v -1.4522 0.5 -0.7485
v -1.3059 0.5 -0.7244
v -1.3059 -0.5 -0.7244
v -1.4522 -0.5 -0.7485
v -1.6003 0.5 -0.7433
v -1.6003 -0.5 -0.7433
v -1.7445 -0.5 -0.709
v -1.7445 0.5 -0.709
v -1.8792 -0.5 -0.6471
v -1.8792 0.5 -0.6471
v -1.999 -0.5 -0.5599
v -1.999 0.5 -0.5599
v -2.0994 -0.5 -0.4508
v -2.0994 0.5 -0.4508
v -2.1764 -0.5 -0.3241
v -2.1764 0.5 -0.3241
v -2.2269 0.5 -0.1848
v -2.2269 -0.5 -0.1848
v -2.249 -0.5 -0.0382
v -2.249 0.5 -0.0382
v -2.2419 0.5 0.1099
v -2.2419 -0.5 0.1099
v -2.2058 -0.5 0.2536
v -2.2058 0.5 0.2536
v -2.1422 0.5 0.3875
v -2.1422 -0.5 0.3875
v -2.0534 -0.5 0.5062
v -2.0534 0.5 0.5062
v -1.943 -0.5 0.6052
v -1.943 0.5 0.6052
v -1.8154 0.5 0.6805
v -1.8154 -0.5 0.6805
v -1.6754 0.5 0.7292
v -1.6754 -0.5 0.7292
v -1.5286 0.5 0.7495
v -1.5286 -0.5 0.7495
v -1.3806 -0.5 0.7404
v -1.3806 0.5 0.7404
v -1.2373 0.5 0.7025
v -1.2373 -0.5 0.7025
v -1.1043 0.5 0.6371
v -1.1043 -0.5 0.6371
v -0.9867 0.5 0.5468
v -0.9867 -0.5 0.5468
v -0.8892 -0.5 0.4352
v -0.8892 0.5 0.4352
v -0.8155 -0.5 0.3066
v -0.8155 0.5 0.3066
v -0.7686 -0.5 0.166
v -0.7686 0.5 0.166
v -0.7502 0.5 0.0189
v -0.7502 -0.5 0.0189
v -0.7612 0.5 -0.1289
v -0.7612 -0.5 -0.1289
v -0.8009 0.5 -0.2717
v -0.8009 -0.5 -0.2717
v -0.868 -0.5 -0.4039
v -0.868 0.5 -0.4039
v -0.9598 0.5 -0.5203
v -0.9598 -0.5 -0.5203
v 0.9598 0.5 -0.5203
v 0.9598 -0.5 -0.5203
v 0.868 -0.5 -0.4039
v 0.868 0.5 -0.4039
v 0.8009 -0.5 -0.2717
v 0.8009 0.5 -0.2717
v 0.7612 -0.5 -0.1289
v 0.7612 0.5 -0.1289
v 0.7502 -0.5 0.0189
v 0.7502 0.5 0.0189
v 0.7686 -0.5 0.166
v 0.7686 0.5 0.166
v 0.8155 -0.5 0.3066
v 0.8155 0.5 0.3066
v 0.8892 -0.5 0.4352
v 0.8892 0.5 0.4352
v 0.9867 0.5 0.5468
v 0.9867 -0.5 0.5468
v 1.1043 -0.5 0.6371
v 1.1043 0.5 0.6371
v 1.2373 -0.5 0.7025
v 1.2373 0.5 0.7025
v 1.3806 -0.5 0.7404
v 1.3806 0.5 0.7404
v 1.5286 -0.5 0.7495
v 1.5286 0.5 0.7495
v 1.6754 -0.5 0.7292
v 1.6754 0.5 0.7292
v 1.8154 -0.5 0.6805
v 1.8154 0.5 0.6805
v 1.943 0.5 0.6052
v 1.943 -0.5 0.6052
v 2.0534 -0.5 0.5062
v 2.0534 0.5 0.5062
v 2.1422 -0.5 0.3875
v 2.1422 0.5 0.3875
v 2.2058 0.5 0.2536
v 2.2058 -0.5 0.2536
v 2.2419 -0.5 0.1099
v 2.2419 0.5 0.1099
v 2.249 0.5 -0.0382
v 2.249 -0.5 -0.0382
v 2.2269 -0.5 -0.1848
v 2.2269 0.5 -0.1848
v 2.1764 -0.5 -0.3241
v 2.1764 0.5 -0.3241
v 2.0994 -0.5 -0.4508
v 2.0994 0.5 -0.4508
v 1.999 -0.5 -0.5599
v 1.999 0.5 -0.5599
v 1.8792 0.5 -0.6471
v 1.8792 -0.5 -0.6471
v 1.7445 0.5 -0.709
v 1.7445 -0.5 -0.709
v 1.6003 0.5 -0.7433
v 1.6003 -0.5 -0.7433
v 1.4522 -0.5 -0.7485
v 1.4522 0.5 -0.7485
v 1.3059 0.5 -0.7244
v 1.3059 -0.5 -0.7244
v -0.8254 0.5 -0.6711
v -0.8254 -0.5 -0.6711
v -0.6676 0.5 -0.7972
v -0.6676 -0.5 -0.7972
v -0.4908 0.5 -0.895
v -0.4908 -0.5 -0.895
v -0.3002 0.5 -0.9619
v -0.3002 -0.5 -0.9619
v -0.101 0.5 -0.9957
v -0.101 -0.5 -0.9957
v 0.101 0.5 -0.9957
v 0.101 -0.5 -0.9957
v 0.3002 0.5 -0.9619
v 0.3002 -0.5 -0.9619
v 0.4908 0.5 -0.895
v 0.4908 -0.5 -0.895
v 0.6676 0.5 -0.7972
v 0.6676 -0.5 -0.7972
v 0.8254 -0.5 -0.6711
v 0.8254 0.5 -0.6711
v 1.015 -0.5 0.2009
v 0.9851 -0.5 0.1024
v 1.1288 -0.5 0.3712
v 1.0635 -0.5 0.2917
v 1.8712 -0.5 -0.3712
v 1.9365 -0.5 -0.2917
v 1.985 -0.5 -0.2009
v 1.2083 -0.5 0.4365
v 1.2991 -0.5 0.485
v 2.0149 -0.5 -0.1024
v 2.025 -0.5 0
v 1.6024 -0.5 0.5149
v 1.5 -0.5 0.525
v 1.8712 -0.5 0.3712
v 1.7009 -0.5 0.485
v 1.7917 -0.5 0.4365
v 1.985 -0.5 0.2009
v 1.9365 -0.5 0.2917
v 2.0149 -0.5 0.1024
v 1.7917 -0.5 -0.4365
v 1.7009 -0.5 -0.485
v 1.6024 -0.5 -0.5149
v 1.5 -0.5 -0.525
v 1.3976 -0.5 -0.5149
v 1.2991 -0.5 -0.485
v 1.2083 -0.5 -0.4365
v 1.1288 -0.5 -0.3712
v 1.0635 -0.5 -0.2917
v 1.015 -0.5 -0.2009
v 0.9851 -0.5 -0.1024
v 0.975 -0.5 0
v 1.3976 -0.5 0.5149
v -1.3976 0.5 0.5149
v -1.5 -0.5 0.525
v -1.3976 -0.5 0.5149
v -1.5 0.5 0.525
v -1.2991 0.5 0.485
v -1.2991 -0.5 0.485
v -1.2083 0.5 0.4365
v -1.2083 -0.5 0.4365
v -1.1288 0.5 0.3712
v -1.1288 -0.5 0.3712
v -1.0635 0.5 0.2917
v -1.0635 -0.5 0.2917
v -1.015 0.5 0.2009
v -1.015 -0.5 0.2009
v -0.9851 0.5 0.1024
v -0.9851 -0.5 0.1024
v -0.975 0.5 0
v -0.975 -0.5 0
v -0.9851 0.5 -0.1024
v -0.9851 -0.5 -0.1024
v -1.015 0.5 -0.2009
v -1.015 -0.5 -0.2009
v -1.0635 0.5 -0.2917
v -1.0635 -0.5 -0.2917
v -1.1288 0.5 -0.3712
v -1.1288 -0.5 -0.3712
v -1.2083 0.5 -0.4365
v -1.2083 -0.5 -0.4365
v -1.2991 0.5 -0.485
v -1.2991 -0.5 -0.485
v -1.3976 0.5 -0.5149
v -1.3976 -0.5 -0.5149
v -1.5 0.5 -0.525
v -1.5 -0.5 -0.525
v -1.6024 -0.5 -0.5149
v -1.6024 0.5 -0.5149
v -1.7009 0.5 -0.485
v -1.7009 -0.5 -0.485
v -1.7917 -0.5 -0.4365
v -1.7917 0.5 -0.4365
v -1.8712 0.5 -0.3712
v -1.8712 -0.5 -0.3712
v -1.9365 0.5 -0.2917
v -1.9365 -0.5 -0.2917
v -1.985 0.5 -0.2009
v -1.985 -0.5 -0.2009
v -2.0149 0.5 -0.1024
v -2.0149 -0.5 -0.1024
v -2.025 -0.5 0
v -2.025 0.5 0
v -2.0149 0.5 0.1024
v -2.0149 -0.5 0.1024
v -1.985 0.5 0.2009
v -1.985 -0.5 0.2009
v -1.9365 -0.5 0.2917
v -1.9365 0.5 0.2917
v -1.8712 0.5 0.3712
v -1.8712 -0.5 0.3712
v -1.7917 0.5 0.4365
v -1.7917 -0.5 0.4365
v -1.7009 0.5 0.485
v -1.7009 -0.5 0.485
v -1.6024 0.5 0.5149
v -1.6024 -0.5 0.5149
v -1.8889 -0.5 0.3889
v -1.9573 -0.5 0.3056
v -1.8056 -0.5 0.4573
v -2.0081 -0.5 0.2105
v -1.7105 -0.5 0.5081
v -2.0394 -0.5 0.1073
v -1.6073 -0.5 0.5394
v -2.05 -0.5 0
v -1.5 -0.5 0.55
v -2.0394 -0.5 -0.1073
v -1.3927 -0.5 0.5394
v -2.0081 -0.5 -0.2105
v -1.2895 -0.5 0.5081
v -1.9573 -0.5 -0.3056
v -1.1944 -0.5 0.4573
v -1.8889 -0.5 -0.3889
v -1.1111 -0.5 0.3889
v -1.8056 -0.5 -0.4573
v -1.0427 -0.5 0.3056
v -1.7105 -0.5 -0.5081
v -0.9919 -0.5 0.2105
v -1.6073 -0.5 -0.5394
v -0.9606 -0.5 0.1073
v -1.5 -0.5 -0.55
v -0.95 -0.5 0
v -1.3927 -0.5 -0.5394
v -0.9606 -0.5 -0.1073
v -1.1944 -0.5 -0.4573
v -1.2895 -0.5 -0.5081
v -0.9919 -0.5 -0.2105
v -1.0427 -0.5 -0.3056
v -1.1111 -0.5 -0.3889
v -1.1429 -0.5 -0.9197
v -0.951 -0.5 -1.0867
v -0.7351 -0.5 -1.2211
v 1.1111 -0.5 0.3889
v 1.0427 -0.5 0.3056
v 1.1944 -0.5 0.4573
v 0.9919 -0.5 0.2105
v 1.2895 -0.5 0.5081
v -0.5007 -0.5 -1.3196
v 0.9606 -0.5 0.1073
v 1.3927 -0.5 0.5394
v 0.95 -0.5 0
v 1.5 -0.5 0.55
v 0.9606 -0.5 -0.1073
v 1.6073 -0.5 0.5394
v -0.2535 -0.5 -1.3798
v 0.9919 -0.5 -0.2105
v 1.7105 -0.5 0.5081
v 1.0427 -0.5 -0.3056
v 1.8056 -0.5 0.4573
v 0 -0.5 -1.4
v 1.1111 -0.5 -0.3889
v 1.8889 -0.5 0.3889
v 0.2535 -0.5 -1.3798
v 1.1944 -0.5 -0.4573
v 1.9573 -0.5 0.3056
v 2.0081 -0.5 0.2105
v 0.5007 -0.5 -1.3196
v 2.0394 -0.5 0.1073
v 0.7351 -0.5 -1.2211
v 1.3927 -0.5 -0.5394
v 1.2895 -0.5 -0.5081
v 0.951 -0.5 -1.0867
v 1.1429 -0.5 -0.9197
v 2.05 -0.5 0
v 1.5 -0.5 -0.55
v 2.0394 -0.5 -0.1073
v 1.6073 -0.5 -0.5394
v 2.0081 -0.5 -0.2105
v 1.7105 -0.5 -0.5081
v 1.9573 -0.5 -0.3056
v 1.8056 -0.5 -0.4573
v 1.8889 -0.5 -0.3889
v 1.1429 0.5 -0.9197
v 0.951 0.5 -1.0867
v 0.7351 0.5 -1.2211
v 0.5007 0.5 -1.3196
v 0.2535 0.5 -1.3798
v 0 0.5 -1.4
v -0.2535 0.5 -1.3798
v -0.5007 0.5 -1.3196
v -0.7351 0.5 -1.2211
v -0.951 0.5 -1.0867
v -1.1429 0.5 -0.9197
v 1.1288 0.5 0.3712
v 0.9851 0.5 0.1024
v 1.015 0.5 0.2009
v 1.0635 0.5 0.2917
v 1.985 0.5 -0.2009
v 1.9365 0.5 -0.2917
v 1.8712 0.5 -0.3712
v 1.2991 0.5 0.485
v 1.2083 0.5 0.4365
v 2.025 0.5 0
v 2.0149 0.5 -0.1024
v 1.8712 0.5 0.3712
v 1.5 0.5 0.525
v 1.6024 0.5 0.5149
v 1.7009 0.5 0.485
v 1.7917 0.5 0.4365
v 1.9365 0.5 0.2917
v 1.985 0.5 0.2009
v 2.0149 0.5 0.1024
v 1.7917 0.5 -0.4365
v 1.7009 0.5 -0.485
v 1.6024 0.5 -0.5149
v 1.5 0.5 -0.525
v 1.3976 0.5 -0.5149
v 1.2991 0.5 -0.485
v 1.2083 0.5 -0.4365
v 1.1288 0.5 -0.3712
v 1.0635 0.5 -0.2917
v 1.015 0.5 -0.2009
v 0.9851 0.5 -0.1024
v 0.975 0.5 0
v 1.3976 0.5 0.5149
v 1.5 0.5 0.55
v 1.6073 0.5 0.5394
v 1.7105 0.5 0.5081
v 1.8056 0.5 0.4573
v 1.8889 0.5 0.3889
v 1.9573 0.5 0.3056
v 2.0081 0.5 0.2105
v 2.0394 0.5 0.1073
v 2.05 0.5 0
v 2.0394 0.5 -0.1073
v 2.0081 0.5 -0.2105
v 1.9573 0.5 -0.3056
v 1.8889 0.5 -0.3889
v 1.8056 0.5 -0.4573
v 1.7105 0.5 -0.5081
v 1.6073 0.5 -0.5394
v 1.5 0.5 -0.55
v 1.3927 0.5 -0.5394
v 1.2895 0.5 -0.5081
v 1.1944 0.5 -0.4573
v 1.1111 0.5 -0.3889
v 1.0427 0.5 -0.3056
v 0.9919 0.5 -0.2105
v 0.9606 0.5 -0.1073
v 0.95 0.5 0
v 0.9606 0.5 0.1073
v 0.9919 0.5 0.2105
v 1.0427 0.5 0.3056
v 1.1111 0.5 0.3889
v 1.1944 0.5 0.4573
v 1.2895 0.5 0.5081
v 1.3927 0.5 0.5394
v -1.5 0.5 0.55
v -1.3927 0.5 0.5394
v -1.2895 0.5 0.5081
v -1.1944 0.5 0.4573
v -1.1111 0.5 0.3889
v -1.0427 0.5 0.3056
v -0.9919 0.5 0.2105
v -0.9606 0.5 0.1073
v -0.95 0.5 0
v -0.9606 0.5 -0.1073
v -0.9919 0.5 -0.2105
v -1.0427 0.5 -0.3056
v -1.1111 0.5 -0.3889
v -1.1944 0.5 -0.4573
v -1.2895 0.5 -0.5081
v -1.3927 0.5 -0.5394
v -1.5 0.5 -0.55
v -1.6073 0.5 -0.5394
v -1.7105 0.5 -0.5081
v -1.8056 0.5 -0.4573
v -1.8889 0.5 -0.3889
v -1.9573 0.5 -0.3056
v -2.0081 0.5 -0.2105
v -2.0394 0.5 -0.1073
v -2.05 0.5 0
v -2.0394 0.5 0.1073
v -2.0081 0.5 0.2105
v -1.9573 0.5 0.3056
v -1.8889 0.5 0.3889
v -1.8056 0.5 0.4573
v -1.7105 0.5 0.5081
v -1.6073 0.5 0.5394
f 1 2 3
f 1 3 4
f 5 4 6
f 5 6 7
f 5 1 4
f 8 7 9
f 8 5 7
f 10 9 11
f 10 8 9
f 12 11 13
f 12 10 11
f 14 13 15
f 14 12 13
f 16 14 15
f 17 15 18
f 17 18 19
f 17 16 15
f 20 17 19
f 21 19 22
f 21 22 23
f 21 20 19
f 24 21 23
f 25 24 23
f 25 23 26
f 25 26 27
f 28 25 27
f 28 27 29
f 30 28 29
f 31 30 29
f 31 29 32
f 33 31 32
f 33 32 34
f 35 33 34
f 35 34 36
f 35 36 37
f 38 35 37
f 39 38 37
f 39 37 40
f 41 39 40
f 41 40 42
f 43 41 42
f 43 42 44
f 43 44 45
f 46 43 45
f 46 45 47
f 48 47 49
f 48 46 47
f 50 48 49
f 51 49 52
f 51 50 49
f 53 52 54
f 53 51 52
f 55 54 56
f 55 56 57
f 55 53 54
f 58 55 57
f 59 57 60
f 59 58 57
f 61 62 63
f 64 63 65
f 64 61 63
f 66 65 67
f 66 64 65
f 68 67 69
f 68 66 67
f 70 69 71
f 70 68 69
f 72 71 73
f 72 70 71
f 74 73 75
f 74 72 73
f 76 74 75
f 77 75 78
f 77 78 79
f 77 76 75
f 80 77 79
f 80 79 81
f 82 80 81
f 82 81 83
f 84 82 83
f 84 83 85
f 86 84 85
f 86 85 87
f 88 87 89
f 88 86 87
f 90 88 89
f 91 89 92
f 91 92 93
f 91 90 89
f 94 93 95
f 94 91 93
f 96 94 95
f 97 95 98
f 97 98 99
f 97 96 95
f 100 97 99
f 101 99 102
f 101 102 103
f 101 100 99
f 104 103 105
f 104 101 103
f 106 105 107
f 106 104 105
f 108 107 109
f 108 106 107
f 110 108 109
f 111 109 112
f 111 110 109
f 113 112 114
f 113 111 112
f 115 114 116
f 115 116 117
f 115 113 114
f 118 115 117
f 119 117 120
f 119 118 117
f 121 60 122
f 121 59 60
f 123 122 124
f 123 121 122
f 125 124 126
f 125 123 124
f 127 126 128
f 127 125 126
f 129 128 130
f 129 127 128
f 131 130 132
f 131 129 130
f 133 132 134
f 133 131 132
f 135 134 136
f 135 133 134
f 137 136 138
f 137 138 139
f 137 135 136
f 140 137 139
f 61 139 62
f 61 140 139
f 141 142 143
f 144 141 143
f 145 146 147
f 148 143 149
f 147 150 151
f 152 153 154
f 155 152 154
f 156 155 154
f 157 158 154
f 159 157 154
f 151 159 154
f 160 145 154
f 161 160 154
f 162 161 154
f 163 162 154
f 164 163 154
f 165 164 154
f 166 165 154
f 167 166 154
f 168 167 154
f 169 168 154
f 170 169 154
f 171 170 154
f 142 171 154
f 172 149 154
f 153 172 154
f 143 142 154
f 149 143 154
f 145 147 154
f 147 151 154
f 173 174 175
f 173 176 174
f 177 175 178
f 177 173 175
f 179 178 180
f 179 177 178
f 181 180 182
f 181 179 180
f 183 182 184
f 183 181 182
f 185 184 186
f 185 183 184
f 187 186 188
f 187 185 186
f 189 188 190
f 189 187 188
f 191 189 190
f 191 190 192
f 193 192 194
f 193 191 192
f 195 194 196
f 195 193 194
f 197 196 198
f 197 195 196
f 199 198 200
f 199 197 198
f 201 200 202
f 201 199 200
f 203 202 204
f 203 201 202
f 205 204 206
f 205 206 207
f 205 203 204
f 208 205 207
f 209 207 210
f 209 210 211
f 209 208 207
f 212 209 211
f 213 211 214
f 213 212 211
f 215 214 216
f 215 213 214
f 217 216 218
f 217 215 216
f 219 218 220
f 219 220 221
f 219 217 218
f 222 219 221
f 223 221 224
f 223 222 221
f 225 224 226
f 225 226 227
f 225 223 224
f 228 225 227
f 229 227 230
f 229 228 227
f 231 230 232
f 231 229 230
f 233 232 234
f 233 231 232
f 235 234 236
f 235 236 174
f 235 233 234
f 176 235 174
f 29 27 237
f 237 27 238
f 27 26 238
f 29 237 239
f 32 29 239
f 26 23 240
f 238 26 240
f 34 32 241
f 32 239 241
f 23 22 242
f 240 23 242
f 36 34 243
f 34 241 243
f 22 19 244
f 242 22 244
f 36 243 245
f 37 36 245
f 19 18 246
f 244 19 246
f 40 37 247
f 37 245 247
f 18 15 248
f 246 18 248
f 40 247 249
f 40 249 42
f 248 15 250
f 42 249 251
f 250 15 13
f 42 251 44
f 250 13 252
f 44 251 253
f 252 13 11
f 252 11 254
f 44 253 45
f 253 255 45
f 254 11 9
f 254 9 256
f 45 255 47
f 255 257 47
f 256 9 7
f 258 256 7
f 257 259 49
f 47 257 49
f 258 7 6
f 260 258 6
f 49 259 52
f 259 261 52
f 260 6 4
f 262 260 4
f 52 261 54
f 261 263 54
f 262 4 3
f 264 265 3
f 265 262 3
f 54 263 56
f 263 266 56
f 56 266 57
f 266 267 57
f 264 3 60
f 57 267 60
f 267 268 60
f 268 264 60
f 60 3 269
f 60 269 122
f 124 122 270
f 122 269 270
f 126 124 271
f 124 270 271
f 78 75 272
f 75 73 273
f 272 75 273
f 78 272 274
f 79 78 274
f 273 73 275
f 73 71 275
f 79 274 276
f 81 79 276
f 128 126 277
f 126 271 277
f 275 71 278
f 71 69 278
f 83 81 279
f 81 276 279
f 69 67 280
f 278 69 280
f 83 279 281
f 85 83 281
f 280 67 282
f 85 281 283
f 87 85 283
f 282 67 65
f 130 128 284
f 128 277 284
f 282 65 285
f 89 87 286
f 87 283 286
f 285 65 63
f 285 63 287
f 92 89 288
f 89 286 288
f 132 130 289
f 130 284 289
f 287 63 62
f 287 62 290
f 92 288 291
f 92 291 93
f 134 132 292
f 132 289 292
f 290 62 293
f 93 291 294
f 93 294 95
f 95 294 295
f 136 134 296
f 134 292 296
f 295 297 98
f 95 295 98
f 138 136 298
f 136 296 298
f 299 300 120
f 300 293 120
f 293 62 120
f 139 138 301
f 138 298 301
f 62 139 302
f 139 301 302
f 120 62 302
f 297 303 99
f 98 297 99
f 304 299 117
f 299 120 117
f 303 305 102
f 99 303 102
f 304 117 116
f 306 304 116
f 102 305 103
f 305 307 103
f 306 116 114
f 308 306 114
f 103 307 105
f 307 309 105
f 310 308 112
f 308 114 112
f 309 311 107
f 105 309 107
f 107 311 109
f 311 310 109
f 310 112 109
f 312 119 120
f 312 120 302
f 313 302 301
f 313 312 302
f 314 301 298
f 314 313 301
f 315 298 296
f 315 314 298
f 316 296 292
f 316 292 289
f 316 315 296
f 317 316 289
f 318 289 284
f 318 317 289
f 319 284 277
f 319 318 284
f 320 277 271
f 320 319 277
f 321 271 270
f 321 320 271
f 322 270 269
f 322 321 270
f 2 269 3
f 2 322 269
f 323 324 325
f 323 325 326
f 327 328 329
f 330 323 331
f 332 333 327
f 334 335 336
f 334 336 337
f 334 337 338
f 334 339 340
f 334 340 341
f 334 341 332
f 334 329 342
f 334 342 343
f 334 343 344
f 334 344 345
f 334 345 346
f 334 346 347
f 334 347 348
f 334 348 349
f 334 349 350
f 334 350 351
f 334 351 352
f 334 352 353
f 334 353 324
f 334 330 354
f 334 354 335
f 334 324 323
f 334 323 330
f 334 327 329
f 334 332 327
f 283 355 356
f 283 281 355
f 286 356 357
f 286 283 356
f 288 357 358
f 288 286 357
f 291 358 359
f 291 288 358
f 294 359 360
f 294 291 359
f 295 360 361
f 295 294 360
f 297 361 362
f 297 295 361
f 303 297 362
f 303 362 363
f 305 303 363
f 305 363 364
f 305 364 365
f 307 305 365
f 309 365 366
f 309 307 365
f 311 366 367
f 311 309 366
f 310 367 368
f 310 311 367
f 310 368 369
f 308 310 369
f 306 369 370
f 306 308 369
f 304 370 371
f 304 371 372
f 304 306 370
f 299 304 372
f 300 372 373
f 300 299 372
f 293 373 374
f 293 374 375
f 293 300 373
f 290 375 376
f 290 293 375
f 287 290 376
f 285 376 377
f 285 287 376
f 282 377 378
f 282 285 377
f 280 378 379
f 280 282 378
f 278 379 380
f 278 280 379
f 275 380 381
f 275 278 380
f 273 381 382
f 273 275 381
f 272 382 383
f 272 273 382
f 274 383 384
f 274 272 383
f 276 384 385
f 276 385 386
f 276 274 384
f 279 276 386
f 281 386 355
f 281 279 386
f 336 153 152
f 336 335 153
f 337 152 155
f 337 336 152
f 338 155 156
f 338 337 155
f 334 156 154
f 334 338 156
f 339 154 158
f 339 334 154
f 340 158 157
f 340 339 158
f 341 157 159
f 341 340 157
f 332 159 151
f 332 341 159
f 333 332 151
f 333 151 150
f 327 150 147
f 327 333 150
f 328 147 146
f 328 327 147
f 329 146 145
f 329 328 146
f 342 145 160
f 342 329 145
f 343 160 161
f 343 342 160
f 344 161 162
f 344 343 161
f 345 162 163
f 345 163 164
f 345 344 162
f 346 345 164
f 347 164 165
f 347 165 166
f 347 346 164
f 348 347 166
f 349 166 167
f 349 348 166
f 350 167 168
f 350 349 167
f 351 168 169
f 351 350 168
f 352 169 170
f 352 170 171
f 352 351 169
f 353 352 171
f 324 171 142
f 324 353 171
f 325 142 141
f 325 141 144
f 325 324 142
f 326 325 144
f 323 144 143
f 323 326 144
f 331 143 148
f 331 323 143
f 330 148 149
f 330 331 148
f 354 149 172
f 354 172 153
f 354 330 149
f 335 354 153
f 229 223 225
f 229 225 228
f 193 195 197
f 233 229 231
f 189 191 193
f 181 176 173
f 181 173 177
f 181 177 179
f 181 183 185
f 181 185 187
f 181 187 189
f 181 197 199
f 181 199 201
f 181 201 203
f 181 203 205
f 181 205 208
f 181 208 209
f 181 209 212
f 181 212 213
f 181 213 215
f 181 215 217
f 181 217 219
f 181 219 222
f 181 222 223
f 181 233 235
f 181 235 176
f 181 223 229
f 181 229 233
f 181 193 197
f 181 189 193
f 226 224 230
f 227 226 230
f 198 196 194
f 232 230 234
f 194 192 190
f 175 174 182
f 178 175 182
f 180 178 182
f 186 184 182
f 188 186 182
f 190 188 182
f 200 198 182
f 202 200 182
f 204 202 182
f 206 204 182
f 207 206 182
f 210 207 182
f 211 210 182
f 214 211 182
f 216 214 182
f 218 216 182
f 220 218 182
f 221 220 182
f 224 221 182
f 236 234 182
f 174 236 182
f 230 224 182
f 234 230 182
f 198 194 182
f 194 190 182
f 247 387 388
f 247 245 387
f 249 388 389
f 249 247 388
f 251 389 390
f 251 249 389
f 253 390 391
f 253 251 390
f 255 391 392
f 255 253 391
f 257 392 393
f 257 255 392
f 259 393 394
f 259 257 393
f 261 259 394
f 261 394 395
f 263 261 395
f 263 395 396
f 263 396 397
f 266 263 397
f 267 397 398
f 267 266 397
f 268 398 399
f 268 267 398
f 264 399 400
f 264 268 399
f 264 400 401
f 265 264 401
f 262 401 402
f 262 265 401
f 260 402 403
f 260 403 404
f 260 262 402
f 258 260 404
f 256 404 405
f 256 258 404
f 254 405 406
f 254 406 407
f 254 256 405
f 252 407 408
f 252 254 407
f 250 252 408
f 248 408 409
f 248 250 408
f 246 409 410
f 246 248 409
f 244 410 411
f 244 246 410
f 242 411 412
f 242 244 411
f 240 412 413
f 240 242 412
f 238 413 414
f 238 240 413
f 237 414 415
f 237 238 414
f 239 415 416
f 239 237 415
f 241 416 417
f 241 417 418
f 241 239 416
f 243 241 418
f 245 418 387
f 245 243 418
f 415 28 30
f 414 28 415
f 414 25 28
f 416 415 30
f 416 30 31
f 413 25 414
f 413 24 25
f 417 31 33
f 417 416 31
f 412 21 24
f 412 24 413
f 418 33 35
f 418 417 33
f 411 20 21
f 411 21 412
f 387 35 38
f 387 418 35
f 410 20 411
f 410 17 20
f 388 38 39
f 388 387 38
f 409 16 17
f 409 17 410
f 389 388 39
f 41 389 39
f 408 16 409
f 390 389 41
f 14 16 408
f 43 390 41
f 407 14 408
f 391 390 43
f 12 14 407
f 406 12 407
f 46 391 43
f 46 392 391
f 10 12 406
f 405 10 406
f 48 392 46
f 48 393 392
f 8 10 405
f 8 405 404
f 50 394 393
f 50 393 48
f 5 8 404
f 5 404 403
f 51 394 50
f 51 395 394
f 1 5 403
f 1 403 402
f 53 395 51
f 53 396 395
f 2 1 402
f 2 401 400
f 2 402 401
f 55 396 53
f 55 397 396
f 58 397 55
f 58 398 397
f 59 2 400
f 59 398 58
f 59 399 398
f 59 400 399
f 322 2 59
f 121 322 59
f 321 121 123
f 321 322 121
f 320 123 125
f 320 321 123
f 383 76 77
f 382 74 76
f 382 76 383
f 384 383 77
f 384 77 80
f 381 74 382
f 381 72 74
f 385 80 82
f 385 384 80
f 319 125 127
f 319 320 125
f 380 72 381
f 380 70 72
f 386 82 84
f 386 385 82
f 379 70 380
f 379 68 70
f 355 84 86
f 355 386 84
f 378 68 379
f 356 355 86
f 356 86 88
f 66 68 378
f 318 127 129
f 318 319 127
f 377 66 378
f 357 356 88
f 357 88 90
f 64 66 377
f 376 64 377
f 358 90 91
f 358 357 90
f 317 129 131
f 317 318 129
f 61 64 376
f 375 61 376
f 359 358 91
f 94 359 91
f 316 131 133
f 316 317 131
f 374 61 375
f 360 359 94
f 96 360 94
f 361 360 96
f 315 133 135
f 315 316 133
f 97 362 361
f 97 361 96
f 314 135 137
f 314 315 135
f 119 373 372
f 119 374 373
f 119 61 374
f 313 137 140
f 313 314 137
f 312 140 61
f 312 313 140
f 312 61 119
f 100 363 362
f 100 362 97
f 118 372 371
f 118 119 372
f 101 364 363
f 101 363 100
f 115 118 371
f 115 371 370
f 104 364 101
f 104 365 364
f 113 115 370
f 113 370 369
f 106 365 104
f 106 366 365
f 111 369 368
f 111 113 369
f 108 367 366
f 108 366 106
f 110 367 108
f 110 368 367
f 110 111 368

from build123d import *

# Parameters (mm, degrees)
SKETCH_1_R        = 0.75
SKETCH_1_R_2      = 0.55
EXTRUDE_1_DEPTH   = 0.5
SKETCH_2_R        = 0.525
EXTRUDE_3_DEPTH   = 0.5
EXTRUDE_3_2_DEPTH = 0.5


with BuildPart() as part:
    # 草图1 → 凸台-拉伸1 (new, symmetric)
    # profile 1 of 3: a face of its own
    with BuildSketch(Plane(origin=(0, 0, 0), x_dir=(1, 0, 0), z_dir=(0, 1, 0))):
        with Locations((1.5, 0)):
            Circle(SKETCH_1_R)
        with Locations(Location((1.5, 0, 0), (0, 0, 270))):
            Circle(SKETCH_1_R_2, mode=Mode.SUBTRACT)
    # profile 2 of 3: a face of its own
    with BuildSketch(Plane(origin=(0, 0, 0), x_dir=(1, 0, 0), z_dir=(0, 1, 0))):
        with Locations((-1.5, 0)):
            Circle(SKETCH_1_R)
        with Locations(Location((-1.5, 0, 0), (0, 0, 270))):
            Circle(SKETCH_1_R_2, mode=Mode.SUBTRACT)
    # profile 3 of 3: a face of its own
    with BuildSketch(Plane(origin=(0, 0, 0), x_dir=(1, 0, 0), z_dir=(0, 1, 0))):
        with BuildLine():
            ThreePointArc((-1.305906669, 0.724449984), (-1.118922567, 0.645972128), (-0.95979731, 0.520270174))
            ThreePointArc((-0.95979731, 0.520270174), (0, 1), (0.95979731, 0.520270174))
            ThreePointArc((0.95979731, 0.520270174), (1.118922567, 0.645972128), (1.305906669, 0.724449984))
            ThreePointArc((1.305906669, 0.724449984), (0, 1.4), (-1.305906669, 0.724449984))
        make_face()
    extrude(amount=EXTRUDE_1_DEPTH, both=True)


with BuildPart() as body_2:
    # 草图2 → 凸台-拉伸3 (new, symmetric)
    with BuildSketch(Plane(origin=(0, 0, 0), x_dir=(1, 0, 0), z_dir=(0, 1, 0))):
        with Locations(Location((-1.5, 0, 0), (0, 0, 270))):
            Circle(SKETCH_2_R)
    extrude(amount=EXTRUDE_3_DEPTH, both=True)


with BuildPart() as body_3:
    # 草图2 → Extrude 3 2 (new, symmetric)
    with BuildSketch(Plane(origin=(0, 0, 0), x_dir=(1, 0, 0), z_dir=(0, 1, 0))):
        with Locations(Location((1.5, 0, 0), (0, 0, 270))):
            Circle(SKETCH_2_R)
    extrude(amount=EXTRUDE_3_2_DEPTH, both=True)


solid = Compound([part.part, body_2.part, body_3.part])
